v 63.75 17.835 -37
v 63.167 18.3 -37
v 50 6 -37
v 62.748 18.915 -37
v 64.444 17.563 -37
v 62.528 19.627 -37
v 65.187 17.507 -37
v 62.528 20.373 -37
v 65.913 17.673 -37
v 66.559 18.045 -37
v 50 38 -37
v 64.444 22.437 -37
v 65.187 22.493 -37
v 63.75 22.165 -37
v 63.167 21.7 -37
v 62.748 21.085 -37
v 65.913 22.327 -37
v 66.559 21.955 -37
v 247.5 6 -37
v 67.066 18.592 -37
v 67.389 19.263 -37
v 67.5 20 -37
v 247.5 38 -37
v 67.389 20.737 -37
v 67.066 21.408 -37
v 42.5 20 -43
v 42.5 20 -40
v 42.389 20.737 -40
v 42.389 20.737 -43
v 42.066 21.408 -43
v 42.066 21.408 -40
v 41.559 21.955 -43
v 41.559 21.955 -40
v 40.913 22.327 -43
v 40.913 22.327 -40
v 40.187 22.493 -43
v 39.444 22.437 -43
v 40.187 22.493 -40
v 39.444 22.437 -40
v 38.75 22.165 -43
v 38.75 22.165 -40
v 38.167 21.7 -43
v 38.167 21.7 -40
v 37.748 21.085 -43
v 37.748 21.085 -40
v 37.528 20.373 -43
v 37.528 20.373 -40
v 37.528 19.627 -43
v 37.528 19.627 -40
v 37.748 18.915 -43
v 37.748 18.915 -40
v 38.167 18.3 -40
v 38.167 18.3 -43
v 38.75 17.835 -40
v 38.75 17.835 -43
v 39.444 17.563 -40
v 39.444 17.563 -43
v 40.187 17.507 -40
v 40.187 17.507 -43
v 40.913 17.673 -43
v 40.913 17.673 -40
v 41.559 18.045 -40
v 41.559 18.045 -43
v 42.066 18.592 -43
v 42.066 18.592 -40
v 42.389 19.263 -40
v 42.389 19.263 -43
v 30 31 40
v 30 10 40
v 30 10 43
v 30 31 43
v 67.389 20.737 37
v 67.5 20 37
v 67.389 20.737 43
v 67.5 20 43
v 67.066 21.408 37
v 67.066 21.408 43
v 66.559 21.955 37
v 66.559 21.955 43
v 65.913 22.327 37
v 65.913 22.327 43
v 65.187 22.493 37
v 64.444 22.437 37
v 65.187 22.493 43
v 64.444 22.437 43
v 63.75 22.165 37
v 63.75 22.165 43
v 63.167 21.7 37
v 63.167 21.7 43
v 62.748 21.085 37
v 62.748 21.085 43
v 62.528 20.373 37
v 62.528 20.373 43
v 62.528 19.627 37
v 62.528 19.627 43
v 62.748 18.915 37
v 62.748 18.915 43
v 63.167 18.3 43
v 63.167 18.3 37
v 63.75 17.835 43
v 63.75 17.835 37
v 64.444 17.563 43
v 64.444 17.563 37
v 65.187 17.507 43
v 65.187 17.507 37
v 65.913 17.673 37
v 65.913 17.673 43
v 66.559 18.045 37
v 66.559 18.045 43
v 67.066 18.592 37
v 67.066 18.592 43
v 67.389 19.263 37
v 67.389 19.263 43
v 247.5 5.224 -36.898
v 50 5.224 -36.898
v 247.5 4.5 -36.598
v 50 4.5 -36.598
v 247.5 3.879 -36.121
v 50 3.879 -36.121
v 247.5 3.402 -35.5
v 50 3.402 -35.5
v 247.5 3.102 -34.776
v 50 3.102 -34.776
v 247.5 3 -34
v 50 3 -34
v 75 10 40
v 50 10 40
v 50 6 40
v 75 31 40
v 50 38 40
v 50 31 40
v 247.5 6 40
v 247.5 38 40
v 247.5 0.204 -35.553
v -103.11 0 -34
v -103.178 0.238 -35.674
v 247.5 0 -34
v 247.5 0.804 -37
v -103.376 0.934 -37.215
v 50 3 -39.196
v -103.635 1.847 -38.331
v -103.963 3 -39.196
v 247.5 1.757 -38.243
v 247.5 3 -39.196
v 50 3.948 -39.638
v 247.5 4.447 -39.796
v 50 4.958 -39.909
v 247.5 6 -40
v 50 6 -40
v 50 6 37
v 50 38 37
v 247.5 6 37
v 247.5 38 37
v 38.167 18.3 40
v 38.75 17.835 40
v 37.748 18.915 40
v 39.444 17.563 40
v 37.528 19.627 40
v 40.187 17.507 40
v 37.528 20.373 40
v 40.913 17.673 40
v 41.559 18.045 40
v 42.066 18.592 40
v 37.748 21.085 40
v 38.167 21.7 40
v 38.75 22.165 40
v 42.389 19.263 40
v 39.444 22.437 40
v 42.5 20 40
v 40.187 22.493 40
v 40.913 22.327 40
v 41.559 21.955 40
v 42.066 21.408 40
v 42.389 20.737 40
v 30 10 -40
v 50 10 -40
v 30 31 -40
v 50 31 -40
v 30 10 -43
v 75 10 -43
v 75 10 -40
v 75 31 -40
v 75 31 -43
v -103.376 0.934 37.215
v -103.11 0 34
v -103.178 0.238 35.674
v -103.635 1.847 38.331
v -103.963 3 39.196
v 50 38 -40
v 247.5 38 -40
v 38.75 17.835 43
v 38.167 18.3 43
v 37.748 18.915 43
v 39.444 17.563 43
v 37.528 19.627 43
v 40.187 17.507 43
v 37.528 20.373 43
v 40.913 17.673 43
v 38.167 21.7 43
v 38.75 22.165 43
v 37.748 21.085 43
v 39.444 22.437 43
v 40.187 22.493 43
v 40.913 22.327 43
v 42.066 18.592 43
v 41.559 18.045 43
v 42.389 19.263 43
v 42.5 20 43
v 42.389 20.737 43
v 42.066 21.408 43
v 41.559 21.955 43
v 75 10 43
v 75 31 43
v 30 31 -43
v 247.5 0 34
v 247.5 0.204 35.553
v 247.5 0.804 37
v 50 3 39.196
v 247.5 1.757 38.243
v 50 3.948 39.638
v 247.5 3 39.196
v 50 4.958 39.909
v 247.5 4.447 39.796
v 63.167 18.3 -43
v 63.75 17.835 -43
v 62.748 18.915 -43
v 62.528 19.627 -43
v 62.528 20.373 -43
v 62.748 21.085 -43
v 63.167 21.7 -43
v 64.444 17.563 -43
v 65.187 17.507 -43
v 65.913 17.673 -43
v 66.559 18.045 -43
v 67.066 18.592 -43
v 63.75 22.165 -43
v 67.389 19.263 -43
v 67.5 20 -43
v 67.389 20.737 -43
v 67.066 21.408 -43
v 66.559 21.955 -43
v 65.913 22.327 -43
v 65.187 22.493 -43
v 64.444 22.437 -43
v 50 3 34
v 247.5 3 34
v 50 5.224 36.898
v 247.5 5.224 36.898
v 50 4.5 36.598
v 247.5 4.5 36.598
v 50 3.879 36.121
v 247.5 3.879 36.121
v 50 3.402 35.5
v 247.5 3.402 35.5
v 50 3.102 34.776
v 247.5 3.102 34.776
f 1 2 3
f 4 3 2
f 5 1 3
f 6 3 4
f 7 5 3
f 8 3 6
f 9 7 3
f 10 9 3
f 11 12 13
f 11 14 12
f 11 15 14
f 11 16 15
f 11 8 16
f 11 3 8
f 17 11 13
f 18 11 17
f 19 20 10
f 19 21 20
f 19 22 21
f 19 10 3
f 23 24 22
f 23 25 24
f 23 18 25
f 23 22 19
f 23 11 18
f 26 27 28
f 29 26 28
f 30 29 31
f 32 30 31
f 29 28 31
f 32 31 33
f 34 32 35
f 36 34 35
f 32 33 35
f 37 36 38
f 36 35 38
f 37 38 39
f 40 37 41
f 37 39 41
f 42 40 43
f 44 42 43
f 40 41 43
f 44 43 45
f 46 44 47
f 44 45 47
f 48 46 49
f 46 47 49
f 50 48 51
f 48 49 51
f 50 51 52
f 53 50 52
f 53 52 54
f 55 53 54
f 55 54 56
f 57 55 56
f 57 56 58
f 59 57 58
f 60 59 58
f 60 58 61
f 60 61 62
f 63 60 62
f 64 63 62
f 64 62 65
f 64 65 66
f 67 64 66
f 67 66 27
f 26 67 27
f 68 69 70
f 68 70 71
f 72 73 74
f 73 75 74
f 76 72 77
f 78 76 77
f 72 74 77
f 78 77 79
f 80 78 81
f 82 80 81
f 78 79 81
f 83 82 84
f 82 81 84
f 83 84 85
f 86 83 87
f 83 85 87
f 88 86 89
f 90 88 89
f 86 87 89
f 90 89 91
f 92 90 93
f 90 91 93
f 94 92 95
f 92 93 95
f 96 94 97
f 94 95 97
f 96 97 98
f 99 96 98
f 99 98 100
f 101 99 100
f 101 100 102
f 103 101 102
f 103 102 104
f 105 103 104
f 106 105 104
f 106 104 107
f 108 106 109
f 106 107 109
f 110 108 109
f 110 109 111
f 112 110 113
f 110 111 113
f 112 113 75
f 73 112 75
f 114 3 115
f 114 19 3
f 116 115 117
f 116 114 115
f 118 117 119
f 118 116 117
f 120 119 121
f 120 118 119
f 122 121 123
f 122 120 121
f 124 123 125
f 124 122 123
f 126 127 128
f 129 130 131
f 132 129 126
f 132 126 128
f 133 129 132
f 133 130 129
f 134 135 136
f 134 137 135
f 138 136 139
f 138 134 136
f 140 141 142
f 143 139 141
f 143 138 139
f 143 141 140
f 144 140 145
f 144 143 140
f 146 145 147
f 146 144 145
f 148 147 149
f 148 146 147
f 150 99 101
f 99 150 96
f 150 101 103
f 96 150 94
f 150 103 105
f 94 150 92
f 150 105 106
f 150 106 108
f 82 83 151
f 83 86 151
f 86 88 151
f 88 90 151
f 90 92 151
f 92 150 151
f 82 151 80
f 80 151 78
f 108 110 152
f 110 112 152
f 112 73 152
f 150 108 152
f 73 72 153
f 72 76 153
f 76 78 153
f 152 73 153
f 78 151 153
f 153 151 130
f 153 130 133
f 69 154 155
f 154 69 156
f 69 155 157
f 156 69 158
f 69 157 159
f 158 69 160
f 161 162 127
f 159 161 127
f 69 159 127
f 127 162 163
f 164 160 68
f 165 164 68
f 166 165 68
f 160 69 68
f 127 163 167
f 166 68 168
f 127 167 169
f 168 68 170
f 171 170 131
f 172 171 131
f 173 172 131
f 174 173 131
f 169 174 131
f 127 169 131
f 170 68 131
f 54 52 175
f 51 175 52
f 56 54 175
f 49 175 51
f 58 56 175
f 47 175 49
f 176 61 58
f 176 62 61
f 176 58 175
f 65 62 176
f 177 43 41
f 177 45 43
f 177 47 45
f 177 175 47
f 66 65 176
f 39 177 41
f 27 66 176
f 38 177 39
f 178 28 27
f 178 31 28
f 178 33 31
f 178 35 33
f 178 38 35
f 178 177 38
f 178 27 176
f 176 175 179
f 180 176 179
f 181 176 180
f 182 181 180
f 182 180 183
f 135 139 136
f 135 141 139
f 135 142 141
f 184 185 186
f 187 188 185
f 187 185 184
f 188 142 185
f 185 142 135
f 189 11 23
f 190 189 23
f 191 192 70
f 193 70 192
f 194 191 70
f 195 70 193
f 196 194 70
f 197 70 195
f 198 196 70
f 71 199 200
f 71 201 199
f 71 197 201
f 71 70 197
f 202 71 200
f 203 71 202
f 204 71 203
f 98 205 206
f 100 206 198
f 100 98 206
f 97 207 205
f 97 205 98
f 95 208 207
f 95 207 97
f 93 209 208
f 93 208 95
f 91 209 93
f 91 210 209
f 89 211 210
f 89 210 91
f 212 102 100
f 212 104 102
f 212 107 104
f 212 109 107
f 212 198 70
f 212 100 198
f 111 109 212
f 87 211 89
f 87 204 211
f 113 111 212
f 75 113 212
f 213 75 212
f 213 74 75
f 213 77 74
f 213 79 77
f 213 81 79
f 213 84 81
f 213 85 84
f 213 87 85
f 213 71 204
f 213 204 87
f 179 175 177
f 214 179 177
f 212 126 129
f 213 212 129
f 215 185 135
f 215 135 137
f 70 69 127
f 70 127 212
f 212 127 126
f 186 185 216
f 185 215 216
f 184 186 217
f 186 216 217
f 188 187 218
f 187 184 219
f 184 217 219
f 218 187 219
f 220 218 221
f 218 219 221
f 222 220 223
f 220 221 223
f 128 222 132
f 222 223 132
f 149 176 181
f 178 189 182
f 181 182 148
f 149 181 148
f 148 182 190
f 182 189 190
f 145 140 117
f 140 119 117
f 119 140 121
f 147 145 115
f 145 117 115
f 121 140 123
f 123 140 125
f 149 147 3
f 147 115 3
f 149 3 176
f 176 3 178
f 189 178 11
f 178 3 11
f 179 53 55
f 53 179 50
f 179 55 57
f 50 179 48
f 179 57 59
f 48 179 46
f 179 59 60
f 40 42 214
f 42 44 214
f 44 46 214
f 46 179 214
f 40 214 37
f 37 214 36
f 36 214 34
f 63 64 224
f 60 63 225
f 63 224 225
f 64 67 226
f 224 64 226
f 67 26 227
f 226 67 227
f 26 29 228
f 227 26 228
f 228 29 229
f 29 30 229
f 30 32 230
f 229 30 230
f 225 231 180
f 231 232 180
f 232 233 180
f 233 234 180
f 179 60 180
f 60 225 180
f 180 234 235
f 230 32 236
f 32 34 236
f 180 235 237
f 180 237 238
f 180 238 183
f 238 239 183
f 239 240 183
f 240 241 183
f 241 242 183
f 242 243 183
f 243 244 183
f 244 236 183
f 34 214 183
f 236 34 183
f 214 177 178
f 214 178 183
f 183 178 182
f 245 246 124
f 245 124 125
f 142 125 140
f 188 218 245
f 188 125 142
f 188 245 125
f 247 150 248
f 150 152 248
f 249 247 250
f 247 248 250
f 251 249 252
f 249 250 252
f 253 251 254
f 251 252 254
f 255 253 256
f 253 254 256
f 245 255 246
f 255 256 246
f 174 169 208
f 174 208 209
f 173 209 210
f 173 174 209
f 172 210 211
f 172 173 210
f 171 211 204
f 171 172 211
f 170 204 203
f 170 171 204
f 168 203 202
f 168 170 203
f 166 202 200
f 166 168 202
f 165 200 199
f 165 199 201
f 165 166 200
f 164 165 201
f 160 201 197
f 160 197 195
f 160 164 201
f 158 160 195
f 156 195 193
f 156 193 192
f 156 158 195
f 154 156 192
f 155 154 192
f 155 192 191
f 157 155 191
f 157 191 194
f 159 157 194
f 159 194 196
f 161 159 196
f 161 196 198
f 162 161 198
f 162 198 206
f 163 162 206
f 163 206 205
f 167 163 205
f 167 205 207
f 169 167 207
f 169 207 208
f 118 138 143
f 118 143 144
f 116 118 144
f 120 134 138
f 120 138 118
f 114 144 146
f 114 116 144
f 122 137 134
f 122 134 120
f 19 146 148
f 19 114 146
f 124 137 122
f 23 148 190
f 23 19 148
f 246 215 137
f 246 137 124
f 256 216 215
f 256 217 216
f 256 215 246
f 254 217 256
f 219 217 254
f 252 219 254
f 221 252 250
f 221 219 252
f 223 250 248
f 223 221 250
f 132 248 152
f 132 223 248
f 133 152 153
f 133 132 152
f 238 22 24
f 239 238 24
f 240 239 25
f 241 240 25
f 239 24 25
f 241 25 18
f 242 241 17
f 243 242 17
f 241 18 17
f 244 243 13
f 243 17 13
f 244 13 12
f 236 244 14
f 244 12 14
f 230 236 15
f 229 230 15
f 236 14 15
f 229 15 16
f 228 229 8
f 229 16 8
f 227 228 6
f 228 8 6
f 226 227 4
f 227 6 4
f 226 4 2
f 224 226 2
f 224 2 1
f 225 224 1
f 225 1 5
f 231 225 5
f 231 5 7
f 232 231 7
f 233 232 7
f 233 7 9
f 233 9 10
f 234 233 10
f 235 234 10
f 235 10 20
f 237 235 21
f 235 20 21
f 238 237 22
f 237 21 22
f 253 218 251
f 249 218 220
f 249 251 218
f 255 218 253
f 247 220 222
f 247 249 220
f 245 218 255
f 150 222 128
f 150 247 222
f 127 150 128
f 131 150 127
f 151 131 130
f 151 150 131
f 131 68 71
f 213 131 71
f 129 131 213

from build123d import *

# Parameters (mm, degrees)
FLOOR_2_DEPTH        = 40
SIDE_START           = 37
SKETCH_2_W           = 197.5
SKETCH_2_H           = 35
SIDE_FRONT_DEPTH     = 3
SIDE_START_2         = -37
SKETCH_3_W           = 197.5
SKETCH_3_H           = 35
SIDE_REAR_DEPTH      = 3
INSIDE_BEND_FRONT_R  = 3
INSIDE_BEND_REAR_R   = 3
OUTSIDE_BEND_FRONT_R = 6
OUTSIDE_BEND_REAR_R  = 6
JOINT_START          = 40
SKETCH_4_W           = 45
SKETCH_4_H           = 21
JOINT_FRONT_DEPTH    = 3
JOINT_START_2        = -40
SKETCH_5_W           = 45
SKETCH_5_H           = 21
JOINT_REAR_DEPTH     = 3
SKETCH_6_R           = 2.5
FIXING_HOLES_DEPTH   = 43


with BuildPart() as part:
    # 草图1 → Floor 2 (new, symmetric)
    with BuildSketch(Plane.XY):
        Polygon((-103.110079617, 0), (247.5, 0), (247.5, 3), (-103.962954093, 3), align=None)
    extrude(amount=FLOOR_2_DEPTH, both=True)

    # 草图2 → Side Front (add)
    with BuildSketch(Plane.XY.offset(SIDE_START)):
        with Locations((148.75, 20.5)):
            Rectangle(SKETCH_2_W, SKETCH_2_H)
    extrude(amount=SIDE_FRONT_DEPTH)

    # 草图3 → Side Rear (add)
    with BuildSketch(Plane.XY.offset(SIDE_START_2)):
        with Locations((148.75, 20.5)):
            Rectangle(SKETCH_3_W, SKETCH_3_H)
    extrude(amount=-SIDE_REAR_DEPTH)

    # Inside Bend Front
    inside_bend_front_edges = [part.edges().sort_by_distance(p)[0] for p in [
        (148.75, 3, 37),
    ]]
    fillet(inside_bend_front_edges, radius=INSIDE_BEND_FRONT_R)

    # Inside Bend Rear
    inside_bend_rear_edges = [part.edges().sort_by_distance(p)[0] for p in [
        (148.75, 3, -37),
    ]]
    fillet(inside_bend_rear_edges, radius=INSIDE_BEND_REAR_R)

    # Outside Bend Front
    outside_bend_front_edges = [part.edges().sort_by_distance(p)[0] for p in [
        (72.194960192, 0, 40),
    ]]
    fillet(outside_bend_front_edges, radius=OUTSIDE_BEND_FRONT_R)

    # Outside Bend Rear
    outside_bend_rear_edges = [part.edges().sort_by_distance(p)[0] for p in [
        (72.194960192, 0, -40),
    ]]
    fillet(outside_bend_rear_edges, radius=OUTSIDE_BEND_REAR_R)

    # 草图4 → Joint Front (add)
    with BuildSketch(Plane.XY.offset(JOINT_START)):
        with Locations((52.5, 20.5)):
            Rectangle(SKETCH_4_W, SKETCH_4_H)
    extrude(amount=JOINT_FRONT_DEPTH)

    # 草图5 → Joint Rear (add)
    with BuildSketch(Plane.XY.offset(JOINT_START_2)):
        with Locations((52.5, 20.5)):
            Rectangle(SKETCH_5_W, SKETCH_5_H)
    extrude(amount=-JOINT_REAR_DEPTH)

    # 草图6 → Fixing Holes (cut, symmetric)
    with BuildSketch(Plane.XY):
        with Locations((40, 20)):
            Circle(SKETCH_6_R)
        with Locations((65, 20)):
            Circle(SKETCH_6_R)
    extrude(amount=FIXING_HOLES_DEPTH, both=True, mode=Mode.SUBTRACT)


solid = part.part
